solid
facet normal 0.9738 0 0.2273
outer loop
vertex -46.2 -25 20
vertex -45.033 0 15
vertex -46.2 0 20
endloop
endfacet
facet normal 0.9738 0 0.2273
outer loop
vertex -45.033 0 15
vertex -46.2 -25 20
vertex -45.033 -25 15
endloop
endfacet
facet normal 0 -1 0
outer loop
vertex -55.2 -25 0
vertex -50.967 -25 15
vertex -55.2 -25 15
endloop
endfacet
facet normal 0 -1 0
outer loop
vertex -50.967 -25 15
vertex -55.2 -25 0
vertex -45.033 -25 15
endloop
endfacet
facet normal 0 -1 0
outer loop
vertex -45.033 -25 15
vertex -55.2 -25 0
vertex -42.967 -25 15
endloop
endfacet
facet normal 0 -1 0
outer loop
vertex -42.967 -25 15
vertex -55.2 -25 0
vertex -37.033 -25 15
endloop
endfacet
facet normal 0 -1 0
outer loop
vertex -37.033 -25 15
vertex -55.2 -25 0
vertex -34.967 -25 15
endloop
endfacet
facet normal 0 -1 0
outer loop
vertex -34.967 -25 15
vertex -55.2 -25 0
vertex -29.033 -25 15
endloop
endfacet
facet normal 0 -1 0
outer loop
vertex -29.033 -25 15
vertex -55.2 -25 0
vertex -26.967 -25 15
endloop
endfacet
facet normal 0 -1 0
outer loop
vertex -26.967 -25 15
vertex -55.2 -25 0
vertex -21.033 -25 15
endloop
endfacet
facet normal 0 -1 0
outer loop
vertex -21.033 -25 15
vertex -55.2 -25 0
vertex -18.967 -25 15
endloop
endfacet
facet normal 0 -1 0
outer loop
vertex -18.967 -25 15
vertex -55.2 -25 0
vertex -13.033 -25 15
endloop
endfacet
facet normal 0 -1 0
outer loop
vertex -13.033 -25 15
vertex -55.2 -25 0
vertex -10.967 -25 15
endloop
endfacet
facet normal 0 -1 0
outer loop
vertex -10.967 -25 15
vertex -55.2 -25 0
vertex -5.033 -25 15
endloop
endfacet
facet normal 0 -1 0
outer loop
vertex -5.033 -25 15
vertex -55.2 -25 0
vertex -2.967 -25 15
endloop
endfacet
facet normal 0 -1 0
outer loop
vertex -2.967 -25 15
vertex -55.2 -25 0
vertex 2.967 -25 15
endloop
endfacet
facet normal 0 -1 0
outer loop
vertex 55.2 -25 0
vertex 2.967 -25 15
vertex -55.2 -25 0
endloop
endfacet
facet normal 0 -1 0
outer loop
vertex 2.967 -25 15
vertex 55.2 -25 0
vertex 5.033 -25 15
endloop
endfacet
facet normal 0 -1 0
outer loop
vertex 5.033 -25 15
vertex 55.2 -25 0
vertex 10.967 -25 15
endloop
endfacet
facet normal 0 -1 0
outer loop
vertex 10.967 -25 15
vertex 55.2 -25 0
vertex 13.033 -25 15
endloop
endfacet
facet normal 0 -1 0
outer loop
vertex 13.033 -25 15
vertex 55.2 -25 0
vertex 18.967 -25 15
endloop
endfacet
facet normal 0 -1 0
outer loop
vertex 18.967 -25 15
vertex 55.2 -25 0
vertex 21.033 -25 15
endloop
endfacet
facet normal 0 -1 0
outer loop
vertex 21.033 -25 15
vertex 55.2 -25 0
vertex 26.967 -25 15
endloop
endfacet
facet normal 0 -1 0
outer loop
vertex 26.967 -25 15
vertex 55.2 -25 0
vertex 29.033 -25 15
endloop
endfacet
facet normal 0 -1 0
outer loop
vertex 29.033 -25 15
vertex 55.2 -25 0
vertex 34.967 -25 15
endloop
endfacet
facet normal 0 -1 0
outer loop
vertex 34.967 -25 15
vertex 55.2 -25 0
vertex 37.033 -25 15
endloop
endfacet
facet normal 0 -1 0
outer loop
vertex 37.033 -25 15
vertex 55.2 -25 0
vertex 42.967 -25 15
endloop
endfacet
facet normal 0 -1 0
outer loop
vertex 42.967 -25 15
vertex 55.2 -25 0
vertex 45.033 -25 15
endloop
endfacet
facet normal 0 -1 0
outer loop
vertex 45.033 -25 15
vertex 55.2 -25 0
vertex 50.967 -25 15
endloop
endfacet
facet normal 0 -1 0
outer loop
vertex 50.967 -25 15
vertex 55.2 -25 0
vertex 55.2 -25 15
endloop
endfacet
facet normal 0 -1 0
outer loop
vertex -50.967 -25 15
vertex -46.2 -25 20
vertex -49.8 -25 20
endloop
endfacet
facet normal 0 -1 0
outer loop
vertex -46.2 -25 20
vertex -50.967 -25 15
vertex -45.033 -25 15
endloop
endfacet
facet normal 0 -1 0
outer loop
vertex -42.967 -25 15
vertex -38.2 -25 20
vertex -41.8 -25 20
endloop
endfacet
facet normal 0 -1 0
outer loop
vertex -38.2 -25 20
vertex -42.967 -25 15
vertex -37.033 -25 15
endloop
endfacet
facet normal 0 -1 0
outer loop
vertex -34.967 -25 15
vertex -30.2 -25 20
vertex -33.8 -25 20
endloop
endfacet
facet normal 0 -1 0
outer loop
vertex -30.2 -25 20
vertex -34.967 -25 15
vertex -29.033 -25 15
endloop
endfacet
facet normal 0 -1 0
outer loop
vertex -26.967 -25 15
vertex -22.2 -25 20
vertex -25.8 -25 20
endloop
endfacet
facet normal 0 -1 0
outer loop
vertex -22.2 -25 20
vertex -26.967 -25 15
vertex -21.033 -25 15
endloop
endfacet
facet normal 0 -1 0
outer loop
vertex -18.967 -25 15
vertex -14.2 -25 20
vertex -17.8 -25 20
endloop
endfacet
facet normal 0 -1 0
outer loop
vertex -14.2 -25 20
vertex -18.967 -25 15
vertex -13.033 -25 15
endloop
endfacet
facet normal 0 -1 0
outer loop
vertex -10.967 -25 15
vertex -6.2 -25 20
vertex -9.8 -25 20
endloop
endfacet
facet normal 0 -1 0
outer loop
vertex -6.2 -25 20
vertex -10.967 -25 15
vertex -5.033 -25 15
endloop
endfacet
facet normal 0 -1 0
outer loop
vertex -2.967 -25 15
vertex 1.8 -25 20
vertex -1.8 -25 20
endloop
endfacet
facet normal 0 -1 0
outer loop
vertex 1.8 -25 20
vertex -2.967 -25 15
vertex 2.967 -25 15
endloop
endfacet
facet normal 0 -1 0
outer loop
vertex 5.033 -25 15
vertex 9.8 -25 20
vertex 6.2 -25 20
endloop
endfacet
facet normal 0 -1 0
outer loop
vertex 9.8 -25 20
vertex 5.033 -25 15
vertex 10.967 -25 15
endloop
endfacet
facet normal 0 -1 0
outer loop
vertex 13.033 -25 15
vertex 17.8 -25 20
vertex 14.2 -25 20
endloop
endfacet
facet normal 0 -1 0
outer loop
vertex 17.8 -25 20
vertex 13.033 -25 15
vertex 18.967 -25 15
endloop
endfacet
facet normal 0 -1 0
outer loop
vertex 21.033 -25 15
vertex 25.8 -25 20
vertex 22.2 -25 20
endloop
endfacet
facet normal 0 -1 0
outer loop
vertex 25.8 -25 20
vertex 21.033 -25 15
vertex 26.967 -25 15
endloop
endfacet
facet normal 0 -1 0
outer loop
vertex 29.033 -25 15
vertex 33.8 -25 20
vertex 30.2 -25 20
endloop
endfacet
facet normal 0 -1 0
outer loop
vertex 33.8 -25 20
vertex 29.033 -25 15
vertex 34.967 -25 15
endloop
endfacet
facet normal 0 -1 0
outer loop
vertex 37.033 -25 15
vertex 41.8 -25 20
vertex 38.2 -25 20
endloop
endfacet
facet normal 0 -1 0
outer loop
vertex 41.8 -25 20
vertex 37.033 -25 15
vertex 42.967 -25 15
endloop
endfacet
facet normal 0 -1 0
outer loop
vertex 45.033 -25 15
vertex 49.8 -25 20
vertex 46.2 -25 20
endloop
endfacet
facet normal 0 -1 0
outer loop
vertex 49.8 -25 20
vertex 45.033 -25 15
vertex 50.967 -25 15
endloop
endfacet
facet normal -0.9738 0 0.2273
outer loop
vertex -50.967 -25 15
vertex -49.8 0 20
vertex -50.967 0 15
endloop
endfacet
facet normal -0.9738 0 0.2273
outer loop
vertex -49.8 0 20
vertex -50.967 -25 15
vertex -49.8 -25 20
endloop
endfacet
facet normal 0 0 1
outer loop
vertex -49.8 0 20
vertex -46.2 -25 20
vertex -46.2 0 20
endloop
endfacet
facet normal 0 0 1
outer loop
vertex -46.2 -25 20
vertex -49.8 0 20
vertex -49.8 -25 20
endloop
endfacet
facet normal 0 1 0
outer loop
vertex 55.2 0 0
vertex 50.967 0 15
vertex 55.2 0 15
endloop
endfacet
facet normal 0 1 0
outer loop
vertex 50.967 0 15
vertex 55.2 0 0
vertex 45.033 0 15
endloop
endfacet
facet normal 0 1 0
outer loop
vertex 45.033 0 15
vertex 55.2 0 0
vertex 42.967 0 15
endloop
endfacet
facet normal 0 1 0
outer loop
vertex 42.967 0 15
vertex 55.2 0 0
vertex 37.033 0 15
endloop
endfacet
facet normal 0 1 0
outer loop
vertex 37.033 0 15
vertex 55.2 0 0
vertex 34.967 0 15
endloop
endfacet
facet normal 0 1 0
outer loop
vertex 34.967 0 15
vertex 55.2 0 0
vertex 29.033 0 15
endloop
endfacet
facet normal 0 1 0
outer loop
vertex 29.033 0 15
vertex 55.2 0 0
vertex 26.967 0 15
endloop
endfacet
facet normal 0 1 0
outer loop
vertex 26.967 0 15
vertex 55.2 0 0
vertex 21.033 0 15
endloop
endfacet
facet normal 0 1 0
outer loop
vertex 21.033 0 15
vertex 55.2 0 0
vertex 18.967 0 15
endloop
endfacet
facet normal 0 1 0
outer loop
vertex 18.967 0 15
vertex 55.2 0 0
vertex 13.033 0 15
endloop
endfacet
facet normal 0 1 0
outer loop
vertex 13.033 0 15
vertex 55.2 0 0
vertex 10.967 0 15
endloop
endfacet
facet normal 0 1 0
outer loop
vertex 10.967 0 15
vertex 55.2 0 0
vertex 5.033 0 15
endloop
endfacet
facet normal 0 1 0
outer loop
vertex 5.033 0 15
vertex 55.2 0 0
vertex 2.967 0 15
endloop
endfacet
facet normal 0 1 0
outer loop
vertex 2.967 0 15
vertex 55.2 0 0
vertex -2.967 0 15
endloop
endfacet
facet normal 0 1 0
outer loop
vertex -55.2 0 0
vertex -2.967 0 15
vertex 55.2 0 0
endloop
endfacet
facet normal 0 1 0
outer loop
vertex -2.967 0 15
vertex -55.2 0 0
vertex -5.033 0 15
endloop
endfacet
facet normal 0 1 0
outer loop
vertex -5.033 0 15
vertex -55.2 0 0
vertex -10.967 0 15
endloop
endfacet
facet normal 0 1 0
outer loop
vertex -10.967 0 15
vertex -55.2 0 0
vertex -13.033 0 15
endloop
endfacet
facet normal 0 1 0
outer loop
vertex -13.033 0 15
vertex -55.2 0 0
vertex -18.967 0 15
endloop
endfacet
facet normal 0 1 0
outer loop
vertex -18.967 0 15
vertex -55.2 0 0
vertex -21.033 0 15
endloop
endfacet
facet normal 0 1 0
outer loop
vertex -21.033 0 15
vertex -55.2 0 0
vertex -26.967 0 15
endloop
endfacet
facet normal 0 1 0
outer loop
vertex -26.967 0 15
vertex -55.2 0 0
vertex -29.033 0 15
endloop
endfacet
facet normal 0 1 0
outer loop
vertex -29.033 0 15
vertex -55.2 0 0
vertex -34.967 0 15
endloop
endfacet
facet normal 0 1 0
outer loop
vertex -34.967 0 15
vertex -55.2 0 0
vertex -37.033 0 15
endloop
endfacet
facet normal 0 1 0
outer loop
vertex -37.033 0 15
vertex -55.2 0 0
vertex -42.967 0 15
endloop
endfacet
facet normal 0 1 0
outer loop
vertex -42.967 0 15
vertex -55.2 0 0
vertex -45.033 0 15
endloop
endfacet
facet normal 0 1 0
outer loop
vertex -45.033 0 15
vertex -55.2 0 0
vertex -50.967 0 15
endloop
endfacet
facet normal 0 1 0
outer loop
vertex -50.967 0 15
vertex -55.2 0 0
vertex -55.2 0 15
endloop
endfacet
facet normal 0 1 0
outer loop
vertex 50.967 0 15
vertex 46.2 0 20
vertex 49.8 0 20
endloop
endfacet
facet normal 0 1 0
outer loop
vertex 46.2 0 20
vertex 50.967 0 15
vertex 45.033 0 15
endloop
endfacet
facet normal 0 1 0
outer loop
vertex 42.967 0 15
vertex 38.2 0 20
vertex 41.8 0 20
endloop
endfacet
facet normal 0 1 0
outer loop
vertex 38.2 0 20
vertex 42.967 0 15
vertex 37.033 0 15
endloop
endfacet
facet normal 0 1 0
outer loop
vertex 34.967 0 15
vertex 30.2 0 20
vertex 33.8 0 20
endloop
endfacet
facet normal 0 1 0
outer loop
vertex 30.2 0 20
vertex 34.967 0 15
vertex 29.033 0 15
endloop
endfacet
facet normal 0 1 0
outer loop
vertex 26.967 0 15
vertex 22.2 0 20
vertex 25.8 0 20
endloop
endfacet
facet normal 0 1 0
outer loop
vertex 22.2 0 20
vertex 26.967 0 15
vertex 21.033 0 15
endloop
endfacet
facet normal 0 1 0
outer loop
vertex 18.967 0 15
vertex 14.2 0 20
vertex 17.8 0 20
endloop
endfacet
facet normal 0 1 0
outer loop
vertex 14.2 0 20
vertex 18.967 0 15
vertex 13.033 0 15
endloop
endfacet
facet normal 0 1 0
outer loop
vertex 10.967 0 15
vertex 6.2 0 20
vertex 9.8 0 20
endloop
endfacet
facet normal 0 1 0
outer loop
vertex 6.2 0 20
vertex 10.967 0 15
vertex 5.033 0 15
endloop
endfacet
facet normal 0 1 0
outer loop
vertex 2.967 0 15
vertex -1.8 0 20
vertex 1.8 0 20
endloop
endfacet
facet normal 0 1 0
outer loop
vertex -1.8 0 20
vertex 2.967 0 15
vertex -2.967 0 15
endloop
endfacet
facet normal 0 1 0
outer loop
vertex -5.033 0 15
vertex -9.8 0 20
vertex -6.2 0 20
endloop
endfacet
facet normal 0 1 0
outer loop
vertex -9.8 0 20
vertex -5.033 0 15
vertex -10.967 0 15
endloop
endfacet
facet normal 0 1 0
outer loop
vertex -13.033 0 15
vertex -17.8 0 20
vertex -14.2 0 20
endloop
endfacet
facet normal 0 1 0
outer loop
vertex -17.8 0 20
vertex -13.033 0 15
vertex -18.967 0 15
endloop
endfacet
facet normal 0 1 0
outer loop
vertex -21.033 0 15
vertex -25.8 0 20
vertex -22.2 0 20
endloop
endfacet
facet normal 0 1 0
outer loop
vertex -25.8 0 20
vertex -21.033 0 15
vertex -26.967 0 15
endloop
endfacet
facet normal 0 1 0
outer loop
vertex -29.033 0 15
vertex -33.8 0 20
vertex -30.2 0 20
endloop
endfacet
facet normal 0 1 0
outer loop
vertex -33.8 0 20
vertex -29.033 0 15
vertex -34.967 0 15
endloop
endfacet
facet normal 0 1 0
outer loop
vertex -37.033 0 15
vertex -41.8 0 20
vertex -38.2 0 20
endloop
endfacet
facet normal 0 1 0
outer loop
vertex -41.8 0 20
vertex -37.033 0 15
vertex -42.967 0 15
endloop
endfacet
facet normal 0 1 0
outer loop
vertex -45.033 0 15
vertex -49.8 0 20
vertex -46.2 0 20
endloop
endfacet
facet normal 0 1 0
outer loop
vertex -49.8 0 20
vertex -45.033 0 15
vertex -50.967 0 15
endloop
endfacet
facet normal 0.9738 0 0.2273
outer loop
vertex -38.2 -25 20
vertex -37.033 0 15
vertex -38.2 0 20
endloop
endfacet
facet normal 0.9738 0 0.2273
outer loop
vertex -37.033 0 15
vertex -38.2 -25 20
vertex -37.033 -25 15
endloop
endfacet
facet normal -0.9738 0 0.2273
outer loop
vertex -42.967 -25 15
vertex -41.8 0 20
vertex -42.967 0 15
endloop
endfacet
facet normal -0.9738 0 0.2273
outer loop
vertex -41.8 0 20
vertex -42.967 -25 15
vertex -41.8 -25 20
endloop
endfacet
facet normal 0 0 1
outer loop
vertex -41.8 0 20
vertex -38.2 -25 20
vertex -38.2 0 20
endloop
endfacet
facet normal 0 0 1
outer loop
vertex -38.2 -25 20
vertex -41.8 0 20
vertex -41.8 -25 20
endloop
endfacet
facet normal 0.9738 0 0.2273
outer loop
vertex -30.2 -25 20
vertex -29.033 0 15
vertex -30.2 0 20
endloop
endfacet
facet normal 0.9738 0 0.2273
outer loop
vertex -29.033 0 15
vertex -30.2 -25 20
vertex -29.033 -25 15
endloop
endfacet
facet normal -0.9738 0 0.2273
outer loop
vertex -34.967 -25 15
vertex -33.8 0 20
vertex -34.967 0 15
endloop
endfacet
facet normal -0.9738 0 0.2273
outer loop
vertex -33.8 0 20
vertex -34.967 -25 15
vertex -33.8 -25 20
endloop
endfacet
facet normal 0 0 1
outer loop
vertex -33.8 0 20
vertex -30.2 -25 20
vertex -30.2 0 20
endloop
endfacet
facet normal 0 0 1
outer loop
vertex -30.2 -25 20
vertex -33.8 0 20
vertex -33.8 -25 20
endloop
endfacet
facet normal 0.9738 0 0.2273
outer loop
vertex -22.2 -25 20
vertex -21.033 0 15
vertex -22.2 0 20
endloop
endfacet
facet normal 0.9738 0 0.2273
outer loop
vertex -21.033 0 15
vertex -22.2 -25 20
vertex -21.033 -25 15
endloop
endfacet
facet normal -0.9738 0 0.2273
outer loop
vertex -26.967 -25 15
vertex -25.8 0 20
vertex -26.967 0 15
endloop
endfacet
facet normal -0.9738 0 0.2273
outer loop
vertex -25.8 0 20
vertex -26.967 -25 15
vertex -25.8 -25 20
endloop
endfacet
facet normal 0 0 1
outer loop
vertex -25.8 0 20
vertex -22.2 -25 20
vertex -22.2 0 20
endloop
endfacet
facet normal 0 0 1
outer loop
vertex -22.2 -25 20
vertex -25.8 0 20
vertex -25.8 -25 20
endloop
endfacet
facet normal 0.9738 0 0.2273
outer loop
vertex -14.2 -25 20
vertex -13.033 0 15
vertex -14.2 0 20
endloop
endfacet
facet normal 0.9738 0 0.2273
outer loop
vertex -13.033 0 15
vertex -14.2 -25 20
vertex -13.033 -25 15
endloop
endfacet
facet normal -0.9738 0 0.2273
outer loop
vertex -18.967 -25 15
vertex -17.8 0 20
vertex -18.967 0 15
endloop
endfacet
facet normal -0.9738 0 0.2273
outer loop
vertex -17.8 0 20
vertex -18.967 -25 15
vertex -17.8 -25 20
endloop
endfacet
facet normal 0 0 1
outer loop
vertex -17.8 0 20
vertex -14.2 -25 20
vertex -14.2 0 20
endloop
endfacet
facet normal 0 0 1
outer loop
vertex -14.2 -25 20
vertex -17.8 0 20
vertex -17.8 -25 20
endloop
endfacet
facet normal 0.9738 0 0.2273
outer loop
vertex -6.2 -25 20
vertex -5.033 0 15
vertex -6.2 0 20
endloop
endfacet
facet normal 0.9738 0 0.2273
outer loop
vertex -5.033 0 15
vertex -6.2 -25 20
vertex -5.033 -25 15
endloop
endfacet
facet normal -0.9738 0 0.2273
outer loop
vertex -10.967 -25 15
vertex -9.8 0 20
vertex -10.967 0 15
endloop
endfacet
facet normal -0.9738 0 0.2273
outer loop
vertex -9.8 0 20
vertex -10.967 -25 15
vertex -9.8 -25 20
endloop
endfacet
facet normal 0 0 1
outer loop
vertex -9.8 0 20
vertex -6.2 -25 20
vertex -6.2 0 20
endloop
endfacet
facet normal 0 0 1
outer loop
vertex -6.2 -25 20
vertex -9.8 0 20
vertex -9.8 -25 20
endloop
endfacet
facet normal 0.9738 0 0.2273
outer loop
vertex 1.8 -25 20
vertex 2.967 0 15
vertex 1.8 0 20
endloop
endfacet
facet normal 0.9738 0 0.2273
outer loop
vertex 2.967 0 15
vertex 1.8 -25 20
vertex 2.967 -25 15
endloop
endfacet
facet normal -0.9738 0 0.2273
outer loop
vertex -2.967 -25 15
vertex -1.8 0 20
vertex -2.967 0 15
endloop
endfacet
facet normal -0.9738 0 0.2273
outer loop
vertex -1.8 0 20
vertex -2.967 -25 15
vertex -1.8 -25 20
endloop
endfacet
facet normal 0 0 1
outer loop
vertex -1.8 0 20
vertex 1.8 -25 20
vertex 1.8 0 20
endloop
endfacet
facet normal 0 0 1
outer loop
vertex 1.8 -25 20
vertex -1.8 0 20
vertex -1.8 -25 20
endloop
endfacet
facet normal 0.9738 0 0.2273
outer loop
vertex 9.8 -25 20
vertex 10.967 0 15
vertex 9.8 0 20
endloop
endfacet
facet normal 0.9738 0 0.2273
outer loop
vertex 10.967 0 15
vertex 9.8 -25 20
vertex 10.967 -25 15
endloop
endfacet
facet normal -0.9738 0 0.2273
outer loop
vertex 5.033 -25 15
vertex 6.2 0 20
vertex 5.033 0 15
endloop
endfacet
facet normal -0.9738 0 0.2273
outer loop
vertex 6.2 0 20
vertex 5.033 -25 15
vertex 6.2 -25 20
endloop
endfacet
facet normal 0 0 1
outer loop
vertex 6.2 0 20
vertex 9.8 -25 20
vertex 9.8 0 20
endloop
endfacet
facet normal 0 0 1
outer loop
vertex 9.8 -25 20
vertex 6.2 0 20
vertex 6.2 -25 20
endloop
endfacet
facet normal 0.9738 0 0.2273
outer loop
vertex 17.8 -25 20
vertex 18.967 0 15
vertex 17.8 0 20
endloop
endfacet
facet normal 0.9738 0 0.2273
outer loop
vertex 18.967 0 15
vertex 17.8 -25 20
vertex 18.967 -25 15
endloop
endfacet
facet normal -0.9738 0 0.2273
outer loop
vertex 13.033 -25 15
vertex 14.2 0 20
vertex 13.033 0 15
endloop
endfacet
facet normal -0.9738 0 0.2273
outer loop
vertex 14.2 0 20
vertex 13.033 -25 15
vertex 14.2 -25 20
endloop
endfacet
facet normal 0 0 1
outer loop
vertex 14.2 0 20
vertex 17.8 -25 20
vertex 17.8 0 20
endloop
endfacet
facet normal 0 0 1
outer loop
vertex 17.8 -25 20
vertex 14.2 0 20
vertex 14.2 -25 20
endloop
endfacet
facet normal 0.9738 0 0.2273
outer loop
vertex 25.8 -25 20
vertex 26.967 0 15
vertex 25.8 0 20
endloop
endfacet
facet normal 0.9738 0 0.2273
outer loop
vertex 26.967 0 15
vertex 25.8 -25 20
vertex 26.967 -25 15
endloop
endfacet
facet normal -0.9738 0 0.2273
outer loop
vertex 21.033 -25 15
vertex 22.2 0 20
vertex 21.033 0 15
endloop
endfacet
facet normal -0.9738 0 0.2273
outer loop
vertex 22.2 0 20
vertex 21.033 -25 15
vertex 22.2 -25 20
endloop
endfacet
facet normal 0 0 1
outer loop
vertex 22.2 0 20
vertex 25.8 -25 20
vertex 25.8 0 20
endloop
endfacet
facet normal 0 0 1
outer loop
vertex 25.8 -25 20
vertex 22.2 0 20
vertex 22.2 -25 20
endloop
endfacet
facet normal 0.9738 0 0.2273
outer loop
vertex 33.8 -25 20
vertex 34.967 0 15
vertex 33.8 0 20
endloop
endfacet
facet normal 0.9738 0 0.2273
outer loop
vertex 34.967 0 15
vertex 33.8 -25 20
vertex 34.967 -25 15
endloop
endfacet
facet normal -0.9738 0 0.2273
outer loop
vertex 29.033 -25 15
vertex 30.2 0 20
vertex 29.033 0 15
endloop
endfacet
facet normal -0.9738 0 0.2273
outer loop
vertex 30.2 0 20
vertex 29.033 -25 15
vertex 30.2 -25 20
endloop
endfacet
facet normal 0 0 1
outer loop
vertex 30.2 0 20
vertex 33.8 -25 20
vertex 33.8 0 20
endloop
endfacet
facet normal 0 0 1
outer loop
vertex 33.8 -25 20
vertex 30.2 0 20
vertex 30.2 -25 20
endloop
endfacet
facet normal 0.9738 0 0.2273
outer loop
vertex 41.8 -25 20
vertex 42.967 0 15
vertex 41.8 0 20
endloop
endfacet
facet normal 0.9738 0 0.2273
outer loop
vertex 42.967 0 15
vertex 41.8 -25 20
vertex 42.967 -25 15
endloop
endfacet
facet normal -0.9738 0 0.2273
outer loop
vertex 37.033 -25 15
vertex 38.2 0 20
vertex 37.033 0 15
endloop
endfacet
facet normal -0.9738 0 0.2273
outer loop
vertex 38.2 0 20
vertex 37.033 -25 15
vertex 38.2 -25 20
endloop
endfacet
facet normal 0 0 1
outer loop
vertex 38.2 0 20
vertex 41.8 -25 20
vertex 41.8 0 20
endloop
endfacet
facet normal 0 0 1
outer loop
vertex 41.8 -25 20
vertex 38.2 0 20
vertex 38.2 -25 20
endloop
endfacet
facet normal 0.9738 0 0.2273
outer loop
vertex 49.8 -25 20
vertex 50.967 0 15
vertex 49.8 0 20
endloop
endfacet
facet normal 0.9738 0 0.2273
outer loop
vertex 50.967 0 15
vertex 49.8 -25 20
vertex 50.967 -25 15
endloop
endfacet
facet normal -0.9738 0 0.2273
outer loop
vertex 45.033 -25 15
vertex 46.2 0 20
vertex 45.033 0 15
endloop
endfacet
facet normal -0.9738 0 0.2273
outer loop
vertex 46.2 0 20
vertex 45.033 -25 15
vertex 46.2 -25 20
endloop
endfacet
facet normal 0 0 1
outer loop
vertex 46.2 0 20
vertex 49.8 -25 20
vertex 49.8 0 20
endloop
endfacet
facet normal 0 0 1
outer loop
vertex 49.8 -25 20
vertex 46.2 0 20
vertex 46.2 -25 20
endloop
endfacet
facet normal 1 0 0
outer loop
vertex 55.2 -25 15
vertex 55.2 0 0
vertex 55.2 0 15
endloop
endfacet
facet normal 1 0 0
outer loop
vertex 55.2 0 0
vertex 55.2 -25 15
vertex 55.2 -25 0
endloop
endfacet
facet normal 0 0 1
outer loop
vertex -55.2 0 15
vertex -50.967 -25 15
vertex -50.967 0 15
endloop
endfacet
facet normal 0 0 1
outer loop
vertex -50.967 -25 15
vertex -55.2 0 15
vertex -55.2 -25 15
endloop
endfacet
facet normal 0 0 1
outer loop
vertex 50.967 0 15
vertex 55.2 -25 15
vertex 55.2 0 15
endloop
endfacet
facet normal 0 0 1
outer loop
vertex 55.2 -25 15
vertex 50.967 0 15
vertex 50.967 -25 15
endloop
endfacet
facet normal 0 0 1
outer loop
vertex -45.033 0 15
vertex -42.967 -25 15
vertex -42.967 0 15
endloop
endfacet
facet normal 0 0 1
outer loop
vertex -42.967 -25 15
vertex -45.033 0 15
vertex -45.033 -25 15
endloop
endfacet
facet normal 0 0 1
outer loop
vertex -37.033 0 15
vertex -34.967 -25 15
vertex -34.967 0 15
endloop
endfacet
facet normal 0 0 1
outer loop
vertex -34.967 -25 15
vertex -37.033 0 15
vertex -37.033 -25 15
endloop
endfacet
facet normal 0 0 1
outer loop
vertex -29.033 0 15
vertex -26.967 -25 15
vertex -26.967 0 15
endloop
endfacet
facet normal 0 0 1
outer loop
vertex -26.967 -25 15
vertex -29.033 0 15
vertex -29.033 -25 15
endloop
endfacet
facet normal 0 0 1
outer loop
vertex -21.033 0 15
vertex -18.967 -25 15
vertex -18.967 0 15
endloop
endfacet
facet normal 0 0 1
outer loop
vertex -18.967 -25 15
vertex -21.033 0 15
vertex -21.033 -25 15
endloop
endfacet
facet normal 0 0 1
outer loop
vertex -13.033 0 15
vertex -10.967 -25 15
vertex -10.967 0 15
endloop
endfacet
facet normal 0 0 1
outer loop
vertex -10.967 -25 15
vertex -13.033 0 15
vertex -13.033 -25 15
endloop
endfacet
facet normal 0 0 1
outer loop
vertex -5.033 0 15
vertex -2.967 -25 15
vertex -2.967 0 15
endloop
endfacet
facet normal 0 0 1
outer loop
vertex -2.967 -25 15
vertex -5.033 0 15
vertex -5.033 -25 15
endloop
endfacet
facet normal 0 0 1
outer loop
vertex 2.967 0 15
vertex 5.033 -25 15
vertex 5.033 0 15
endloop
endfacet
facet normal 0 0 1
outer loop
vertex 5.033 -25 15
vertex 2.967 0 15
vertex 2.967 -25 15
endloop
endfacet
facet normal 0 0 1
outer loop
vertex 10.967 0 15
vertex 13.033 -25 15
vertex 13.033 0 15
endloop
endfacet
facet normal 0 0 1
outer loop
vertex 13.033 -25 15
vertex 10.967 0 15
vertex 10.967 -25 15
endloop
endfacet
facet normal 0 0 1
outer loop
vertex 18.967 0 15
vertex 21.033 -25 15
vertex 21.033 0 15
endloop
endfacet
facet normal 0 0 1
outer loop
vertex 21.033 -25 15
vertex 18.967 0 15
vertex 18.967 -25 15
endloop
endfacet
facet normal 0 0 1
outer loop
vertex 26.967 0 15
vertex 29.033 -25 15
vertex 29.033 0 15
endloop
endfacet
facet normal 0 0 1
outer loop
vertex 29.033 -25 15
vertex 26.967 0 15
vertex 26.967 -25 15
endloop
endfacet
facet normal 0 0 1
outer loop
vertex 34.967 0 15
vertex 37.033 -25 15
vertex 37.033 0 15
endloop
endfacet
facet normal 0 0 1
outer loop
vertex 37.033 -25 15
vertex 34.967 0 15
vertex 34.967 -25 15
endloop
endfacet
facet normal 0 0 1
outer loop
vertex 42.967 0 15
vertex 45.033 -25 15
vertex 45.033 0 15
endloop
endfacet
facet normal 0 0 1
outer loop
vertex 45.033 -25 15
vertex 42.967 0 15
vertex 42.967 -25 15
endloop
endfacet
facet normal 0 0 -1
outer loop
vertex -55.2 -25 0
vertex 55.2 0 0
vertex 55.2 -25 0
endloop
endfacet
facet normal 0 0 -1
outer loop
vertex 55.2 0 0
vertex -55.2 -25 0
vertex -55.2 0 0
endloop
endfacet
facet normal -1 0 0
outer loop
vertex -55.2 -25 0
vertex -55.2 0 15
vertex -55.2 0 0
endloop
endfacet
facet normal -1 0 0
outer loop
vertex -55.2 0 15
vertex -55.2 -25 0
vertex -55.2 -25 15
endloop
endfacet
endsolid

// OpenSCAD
$fn = 32;

// ----------------------------------------------------------------------
// Toothed rack, 13 teeth
// 8 mm pitch, 5 mm teeth
// ----------------------------------------------------------------------

// --- parameters (mm) ---
bar_w = 25;       // bar width (Y)
seat_tol = 0.05;  // tolerance at the seating features
free_tol = 0.3;   // general tolerance on the free sizes
bar_h = 15;       // bar height (Z)
teeth = 13;       // number of teeth
pitch = 8;        // tooth pitch
tooth_h = 5;      // tooth height above the bar
root_w = 6.4;     // tooth width at the root
crest_w = 3.6;    // tooth width at the crest

// --- derived feature positions (mm) ---
span = (teeth - 1) * pitch;  // = 96   distance between the outer teeth
bar_l = span + root_w + 8;   // = 110.4   bar length: teeth plus 4 mm at each end
tooth_x = -span / 2;         // = -48   X of the first tooth
height = bar_h + tooth_h;    // = 20   overall height
feature_centers = [
  [tooth_x + 0 * pitch, -bar_w / 2],
  [tooth_x + 1 * pitch, -bar_w / 2],
  [tooth_x + 2 * pitch, -bar_w / 2],
  [tooth_x + 3 * pitch, -bar_w / 2],
  [tooth_x + 4 * pitch, -bar_w / 2],
  [tooth_x + 5 * pitch, -bar_w / 2],
  [tooth_x + 6 * pitch, -bar_w / 2],
  [tooth_x + 7 * pitch, -bar_w / 2],
  [tooth_x + 8 * pitch, -bar_w / 2],
  [tooth_x + 9 * pitch, -bar_w / 2],
  [tooth_x + 10 * pitch, -bar_w / 2],
  [tooth_x + 11 * pitch, -bar_w / 2],
  [tooth_x + 12 * pitch, -bar_w / 2]
];   // tooth centre line, drives the tooth loop

// bar with a rack of teeth, one extruded trapezoium per centre
module rack_tooth() {
  linear_extrude(height = bar_w)
    polygon(points = [
      [0, 0],
      [root_w, 0],
      [root_w / 2 + crest_w / 2, tooth_h + 1],
      [root_w / 2 - crest_w / 2, tooth_h + 1]
    ]);
}

union() {
  translate([-bar_l / 2, -bar_w, 0]) cube([bar_l, bar_w, bar_h]);
  for (centre = feature_centers)
    translate([centre[0] - root_w / 2, 0, bar_h - 1]) rotate([90, 0, 0]) rack_tooth();
}
